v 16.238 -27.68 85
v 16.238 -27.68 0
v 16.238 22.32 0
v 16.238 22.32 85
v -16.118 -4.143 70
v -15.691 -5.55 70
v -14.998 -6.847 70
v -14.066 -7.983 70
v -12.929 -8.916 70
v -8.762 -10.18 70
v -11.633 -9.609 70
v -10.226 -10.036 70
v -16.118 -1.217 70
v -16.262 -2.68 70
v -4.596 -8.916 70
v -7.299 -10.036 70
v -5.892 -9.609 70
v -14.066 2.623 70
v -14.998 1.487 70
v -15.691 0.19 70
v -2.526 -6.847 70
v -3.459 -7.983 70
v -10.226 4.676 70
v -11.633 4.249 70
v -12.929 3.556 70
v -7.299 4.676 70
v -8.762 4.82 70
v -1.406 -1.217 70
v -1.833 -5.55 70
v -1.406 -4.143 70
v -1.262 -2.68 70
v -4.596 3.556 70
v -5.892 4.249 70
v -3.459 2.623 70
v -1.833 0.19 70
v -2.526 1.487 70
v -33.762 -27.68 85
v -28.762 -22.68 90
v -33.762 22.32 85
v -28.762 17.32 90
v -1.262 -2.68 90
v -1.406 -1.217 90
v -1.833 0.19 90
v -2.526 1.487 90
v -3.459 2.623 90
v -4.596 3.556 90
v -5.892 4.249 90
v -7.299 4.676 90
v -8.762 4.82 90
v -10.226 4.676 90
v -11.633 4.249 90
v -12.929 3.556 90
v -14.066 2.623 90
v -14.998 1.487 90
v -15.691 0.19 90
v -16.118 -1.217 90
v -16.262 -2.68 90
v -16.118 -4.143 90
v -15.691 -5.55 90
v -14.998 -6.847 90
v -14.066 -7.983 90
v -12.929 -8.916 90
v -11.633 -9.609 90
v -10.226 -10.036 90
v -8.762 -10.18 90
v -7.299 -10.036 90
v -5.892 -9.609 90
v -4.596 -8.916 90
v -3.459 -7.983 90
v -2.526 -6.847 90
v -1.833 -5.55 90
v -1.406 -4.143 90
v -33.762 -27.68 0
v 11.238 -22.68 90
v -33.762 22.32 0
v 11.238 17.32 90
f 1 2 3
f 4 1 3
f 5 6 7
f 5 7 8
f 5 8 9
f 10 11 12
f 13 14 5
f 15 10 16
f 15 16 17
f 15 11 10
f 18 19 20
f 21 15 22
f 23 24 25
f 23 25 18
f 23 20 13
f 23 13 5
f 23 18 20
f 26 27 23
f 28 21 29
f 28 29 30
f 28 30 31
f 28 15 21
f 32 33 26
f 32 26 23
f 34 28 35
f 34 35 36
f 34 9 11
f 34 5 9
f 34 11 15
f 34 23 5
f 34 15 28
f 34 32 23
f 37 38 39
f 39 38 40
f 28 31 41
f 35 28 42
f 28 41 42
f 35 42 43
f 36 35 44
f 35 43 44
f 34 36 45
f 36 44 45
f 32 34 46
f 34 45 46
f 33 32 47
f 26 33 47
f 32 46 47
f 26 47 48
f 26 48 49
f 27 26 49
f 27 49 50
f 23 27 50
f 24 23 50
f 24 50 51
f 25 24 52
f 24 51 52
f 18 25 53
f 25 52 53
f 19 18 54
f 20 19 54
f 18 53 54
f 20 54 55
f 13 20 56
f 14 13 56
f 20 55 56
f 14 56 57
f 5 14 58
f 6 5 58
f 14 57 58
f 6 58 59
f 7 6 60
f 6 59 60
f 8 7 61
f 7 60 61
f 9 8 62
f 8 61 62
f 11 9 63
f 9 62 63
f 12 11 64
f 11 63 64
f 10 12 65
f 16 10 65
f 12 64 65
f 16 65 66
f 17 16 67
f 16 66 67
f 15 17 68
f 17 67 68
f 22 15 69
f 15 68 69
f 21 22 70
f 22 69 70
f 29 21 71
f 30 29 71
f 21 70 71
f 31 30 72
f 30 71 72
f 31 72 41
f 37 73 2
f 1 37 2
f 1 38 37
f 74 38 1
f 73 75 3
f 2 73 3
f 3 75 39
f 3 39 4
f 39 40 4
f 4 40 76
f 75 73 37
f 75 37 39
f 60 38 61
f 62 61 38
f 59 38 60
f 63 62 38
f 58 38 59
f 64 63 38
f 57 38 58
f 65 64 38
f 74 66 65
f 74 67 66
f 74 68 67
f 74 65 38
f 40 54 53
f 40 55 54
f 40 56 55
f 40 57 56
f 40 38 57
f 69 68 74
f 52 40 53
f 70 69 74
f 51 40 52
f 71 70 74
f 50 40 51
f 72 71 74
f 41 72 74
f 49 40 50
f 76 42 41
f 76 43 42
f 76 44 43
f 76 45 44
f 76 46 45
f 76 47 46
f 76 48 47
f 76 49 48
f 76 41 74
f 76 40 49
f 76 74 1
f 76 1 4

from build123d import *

# Parameters (mm, degrees)
F0_W     = 50
F0_H     = 50
F1_DEPTH = 90
F2_SIZE  = 5
F4_R     = 7.5
F5_DEPTH = 20


with BuildPart() as f1:
    # F0 (on Top) → F1 (new body)
    with BuildSketch(Plane.XY):
        with Locations((-8.762377, -2.680112)):
            Rectangle(F0_W, F0_H)
    extrude(amount=F1_DEPTH)

    # F2
    f2_edges = [f1.edges().sort_by_distance(p)[0] for p in [
        (-8.762377, 22.319888, 90),
        (-33.762377, -2.680112, 90),
        (-8.762377, -27.680112, 90),
        (16.237623, -2.680112, 90),
    ]]
    chamfer(f2_edges, length=F2_SIZE)

    # F4 (on face) → F5 (cut)
    with BuildSketch(Plane.XY.offset(90)):
        with Locations((-8.762377, -2.680112)):
            Circle(F4_R)
    extrude(amount=-F5_DEPTH, mode=Mode.SUBTRACT)


solid = f1.part
